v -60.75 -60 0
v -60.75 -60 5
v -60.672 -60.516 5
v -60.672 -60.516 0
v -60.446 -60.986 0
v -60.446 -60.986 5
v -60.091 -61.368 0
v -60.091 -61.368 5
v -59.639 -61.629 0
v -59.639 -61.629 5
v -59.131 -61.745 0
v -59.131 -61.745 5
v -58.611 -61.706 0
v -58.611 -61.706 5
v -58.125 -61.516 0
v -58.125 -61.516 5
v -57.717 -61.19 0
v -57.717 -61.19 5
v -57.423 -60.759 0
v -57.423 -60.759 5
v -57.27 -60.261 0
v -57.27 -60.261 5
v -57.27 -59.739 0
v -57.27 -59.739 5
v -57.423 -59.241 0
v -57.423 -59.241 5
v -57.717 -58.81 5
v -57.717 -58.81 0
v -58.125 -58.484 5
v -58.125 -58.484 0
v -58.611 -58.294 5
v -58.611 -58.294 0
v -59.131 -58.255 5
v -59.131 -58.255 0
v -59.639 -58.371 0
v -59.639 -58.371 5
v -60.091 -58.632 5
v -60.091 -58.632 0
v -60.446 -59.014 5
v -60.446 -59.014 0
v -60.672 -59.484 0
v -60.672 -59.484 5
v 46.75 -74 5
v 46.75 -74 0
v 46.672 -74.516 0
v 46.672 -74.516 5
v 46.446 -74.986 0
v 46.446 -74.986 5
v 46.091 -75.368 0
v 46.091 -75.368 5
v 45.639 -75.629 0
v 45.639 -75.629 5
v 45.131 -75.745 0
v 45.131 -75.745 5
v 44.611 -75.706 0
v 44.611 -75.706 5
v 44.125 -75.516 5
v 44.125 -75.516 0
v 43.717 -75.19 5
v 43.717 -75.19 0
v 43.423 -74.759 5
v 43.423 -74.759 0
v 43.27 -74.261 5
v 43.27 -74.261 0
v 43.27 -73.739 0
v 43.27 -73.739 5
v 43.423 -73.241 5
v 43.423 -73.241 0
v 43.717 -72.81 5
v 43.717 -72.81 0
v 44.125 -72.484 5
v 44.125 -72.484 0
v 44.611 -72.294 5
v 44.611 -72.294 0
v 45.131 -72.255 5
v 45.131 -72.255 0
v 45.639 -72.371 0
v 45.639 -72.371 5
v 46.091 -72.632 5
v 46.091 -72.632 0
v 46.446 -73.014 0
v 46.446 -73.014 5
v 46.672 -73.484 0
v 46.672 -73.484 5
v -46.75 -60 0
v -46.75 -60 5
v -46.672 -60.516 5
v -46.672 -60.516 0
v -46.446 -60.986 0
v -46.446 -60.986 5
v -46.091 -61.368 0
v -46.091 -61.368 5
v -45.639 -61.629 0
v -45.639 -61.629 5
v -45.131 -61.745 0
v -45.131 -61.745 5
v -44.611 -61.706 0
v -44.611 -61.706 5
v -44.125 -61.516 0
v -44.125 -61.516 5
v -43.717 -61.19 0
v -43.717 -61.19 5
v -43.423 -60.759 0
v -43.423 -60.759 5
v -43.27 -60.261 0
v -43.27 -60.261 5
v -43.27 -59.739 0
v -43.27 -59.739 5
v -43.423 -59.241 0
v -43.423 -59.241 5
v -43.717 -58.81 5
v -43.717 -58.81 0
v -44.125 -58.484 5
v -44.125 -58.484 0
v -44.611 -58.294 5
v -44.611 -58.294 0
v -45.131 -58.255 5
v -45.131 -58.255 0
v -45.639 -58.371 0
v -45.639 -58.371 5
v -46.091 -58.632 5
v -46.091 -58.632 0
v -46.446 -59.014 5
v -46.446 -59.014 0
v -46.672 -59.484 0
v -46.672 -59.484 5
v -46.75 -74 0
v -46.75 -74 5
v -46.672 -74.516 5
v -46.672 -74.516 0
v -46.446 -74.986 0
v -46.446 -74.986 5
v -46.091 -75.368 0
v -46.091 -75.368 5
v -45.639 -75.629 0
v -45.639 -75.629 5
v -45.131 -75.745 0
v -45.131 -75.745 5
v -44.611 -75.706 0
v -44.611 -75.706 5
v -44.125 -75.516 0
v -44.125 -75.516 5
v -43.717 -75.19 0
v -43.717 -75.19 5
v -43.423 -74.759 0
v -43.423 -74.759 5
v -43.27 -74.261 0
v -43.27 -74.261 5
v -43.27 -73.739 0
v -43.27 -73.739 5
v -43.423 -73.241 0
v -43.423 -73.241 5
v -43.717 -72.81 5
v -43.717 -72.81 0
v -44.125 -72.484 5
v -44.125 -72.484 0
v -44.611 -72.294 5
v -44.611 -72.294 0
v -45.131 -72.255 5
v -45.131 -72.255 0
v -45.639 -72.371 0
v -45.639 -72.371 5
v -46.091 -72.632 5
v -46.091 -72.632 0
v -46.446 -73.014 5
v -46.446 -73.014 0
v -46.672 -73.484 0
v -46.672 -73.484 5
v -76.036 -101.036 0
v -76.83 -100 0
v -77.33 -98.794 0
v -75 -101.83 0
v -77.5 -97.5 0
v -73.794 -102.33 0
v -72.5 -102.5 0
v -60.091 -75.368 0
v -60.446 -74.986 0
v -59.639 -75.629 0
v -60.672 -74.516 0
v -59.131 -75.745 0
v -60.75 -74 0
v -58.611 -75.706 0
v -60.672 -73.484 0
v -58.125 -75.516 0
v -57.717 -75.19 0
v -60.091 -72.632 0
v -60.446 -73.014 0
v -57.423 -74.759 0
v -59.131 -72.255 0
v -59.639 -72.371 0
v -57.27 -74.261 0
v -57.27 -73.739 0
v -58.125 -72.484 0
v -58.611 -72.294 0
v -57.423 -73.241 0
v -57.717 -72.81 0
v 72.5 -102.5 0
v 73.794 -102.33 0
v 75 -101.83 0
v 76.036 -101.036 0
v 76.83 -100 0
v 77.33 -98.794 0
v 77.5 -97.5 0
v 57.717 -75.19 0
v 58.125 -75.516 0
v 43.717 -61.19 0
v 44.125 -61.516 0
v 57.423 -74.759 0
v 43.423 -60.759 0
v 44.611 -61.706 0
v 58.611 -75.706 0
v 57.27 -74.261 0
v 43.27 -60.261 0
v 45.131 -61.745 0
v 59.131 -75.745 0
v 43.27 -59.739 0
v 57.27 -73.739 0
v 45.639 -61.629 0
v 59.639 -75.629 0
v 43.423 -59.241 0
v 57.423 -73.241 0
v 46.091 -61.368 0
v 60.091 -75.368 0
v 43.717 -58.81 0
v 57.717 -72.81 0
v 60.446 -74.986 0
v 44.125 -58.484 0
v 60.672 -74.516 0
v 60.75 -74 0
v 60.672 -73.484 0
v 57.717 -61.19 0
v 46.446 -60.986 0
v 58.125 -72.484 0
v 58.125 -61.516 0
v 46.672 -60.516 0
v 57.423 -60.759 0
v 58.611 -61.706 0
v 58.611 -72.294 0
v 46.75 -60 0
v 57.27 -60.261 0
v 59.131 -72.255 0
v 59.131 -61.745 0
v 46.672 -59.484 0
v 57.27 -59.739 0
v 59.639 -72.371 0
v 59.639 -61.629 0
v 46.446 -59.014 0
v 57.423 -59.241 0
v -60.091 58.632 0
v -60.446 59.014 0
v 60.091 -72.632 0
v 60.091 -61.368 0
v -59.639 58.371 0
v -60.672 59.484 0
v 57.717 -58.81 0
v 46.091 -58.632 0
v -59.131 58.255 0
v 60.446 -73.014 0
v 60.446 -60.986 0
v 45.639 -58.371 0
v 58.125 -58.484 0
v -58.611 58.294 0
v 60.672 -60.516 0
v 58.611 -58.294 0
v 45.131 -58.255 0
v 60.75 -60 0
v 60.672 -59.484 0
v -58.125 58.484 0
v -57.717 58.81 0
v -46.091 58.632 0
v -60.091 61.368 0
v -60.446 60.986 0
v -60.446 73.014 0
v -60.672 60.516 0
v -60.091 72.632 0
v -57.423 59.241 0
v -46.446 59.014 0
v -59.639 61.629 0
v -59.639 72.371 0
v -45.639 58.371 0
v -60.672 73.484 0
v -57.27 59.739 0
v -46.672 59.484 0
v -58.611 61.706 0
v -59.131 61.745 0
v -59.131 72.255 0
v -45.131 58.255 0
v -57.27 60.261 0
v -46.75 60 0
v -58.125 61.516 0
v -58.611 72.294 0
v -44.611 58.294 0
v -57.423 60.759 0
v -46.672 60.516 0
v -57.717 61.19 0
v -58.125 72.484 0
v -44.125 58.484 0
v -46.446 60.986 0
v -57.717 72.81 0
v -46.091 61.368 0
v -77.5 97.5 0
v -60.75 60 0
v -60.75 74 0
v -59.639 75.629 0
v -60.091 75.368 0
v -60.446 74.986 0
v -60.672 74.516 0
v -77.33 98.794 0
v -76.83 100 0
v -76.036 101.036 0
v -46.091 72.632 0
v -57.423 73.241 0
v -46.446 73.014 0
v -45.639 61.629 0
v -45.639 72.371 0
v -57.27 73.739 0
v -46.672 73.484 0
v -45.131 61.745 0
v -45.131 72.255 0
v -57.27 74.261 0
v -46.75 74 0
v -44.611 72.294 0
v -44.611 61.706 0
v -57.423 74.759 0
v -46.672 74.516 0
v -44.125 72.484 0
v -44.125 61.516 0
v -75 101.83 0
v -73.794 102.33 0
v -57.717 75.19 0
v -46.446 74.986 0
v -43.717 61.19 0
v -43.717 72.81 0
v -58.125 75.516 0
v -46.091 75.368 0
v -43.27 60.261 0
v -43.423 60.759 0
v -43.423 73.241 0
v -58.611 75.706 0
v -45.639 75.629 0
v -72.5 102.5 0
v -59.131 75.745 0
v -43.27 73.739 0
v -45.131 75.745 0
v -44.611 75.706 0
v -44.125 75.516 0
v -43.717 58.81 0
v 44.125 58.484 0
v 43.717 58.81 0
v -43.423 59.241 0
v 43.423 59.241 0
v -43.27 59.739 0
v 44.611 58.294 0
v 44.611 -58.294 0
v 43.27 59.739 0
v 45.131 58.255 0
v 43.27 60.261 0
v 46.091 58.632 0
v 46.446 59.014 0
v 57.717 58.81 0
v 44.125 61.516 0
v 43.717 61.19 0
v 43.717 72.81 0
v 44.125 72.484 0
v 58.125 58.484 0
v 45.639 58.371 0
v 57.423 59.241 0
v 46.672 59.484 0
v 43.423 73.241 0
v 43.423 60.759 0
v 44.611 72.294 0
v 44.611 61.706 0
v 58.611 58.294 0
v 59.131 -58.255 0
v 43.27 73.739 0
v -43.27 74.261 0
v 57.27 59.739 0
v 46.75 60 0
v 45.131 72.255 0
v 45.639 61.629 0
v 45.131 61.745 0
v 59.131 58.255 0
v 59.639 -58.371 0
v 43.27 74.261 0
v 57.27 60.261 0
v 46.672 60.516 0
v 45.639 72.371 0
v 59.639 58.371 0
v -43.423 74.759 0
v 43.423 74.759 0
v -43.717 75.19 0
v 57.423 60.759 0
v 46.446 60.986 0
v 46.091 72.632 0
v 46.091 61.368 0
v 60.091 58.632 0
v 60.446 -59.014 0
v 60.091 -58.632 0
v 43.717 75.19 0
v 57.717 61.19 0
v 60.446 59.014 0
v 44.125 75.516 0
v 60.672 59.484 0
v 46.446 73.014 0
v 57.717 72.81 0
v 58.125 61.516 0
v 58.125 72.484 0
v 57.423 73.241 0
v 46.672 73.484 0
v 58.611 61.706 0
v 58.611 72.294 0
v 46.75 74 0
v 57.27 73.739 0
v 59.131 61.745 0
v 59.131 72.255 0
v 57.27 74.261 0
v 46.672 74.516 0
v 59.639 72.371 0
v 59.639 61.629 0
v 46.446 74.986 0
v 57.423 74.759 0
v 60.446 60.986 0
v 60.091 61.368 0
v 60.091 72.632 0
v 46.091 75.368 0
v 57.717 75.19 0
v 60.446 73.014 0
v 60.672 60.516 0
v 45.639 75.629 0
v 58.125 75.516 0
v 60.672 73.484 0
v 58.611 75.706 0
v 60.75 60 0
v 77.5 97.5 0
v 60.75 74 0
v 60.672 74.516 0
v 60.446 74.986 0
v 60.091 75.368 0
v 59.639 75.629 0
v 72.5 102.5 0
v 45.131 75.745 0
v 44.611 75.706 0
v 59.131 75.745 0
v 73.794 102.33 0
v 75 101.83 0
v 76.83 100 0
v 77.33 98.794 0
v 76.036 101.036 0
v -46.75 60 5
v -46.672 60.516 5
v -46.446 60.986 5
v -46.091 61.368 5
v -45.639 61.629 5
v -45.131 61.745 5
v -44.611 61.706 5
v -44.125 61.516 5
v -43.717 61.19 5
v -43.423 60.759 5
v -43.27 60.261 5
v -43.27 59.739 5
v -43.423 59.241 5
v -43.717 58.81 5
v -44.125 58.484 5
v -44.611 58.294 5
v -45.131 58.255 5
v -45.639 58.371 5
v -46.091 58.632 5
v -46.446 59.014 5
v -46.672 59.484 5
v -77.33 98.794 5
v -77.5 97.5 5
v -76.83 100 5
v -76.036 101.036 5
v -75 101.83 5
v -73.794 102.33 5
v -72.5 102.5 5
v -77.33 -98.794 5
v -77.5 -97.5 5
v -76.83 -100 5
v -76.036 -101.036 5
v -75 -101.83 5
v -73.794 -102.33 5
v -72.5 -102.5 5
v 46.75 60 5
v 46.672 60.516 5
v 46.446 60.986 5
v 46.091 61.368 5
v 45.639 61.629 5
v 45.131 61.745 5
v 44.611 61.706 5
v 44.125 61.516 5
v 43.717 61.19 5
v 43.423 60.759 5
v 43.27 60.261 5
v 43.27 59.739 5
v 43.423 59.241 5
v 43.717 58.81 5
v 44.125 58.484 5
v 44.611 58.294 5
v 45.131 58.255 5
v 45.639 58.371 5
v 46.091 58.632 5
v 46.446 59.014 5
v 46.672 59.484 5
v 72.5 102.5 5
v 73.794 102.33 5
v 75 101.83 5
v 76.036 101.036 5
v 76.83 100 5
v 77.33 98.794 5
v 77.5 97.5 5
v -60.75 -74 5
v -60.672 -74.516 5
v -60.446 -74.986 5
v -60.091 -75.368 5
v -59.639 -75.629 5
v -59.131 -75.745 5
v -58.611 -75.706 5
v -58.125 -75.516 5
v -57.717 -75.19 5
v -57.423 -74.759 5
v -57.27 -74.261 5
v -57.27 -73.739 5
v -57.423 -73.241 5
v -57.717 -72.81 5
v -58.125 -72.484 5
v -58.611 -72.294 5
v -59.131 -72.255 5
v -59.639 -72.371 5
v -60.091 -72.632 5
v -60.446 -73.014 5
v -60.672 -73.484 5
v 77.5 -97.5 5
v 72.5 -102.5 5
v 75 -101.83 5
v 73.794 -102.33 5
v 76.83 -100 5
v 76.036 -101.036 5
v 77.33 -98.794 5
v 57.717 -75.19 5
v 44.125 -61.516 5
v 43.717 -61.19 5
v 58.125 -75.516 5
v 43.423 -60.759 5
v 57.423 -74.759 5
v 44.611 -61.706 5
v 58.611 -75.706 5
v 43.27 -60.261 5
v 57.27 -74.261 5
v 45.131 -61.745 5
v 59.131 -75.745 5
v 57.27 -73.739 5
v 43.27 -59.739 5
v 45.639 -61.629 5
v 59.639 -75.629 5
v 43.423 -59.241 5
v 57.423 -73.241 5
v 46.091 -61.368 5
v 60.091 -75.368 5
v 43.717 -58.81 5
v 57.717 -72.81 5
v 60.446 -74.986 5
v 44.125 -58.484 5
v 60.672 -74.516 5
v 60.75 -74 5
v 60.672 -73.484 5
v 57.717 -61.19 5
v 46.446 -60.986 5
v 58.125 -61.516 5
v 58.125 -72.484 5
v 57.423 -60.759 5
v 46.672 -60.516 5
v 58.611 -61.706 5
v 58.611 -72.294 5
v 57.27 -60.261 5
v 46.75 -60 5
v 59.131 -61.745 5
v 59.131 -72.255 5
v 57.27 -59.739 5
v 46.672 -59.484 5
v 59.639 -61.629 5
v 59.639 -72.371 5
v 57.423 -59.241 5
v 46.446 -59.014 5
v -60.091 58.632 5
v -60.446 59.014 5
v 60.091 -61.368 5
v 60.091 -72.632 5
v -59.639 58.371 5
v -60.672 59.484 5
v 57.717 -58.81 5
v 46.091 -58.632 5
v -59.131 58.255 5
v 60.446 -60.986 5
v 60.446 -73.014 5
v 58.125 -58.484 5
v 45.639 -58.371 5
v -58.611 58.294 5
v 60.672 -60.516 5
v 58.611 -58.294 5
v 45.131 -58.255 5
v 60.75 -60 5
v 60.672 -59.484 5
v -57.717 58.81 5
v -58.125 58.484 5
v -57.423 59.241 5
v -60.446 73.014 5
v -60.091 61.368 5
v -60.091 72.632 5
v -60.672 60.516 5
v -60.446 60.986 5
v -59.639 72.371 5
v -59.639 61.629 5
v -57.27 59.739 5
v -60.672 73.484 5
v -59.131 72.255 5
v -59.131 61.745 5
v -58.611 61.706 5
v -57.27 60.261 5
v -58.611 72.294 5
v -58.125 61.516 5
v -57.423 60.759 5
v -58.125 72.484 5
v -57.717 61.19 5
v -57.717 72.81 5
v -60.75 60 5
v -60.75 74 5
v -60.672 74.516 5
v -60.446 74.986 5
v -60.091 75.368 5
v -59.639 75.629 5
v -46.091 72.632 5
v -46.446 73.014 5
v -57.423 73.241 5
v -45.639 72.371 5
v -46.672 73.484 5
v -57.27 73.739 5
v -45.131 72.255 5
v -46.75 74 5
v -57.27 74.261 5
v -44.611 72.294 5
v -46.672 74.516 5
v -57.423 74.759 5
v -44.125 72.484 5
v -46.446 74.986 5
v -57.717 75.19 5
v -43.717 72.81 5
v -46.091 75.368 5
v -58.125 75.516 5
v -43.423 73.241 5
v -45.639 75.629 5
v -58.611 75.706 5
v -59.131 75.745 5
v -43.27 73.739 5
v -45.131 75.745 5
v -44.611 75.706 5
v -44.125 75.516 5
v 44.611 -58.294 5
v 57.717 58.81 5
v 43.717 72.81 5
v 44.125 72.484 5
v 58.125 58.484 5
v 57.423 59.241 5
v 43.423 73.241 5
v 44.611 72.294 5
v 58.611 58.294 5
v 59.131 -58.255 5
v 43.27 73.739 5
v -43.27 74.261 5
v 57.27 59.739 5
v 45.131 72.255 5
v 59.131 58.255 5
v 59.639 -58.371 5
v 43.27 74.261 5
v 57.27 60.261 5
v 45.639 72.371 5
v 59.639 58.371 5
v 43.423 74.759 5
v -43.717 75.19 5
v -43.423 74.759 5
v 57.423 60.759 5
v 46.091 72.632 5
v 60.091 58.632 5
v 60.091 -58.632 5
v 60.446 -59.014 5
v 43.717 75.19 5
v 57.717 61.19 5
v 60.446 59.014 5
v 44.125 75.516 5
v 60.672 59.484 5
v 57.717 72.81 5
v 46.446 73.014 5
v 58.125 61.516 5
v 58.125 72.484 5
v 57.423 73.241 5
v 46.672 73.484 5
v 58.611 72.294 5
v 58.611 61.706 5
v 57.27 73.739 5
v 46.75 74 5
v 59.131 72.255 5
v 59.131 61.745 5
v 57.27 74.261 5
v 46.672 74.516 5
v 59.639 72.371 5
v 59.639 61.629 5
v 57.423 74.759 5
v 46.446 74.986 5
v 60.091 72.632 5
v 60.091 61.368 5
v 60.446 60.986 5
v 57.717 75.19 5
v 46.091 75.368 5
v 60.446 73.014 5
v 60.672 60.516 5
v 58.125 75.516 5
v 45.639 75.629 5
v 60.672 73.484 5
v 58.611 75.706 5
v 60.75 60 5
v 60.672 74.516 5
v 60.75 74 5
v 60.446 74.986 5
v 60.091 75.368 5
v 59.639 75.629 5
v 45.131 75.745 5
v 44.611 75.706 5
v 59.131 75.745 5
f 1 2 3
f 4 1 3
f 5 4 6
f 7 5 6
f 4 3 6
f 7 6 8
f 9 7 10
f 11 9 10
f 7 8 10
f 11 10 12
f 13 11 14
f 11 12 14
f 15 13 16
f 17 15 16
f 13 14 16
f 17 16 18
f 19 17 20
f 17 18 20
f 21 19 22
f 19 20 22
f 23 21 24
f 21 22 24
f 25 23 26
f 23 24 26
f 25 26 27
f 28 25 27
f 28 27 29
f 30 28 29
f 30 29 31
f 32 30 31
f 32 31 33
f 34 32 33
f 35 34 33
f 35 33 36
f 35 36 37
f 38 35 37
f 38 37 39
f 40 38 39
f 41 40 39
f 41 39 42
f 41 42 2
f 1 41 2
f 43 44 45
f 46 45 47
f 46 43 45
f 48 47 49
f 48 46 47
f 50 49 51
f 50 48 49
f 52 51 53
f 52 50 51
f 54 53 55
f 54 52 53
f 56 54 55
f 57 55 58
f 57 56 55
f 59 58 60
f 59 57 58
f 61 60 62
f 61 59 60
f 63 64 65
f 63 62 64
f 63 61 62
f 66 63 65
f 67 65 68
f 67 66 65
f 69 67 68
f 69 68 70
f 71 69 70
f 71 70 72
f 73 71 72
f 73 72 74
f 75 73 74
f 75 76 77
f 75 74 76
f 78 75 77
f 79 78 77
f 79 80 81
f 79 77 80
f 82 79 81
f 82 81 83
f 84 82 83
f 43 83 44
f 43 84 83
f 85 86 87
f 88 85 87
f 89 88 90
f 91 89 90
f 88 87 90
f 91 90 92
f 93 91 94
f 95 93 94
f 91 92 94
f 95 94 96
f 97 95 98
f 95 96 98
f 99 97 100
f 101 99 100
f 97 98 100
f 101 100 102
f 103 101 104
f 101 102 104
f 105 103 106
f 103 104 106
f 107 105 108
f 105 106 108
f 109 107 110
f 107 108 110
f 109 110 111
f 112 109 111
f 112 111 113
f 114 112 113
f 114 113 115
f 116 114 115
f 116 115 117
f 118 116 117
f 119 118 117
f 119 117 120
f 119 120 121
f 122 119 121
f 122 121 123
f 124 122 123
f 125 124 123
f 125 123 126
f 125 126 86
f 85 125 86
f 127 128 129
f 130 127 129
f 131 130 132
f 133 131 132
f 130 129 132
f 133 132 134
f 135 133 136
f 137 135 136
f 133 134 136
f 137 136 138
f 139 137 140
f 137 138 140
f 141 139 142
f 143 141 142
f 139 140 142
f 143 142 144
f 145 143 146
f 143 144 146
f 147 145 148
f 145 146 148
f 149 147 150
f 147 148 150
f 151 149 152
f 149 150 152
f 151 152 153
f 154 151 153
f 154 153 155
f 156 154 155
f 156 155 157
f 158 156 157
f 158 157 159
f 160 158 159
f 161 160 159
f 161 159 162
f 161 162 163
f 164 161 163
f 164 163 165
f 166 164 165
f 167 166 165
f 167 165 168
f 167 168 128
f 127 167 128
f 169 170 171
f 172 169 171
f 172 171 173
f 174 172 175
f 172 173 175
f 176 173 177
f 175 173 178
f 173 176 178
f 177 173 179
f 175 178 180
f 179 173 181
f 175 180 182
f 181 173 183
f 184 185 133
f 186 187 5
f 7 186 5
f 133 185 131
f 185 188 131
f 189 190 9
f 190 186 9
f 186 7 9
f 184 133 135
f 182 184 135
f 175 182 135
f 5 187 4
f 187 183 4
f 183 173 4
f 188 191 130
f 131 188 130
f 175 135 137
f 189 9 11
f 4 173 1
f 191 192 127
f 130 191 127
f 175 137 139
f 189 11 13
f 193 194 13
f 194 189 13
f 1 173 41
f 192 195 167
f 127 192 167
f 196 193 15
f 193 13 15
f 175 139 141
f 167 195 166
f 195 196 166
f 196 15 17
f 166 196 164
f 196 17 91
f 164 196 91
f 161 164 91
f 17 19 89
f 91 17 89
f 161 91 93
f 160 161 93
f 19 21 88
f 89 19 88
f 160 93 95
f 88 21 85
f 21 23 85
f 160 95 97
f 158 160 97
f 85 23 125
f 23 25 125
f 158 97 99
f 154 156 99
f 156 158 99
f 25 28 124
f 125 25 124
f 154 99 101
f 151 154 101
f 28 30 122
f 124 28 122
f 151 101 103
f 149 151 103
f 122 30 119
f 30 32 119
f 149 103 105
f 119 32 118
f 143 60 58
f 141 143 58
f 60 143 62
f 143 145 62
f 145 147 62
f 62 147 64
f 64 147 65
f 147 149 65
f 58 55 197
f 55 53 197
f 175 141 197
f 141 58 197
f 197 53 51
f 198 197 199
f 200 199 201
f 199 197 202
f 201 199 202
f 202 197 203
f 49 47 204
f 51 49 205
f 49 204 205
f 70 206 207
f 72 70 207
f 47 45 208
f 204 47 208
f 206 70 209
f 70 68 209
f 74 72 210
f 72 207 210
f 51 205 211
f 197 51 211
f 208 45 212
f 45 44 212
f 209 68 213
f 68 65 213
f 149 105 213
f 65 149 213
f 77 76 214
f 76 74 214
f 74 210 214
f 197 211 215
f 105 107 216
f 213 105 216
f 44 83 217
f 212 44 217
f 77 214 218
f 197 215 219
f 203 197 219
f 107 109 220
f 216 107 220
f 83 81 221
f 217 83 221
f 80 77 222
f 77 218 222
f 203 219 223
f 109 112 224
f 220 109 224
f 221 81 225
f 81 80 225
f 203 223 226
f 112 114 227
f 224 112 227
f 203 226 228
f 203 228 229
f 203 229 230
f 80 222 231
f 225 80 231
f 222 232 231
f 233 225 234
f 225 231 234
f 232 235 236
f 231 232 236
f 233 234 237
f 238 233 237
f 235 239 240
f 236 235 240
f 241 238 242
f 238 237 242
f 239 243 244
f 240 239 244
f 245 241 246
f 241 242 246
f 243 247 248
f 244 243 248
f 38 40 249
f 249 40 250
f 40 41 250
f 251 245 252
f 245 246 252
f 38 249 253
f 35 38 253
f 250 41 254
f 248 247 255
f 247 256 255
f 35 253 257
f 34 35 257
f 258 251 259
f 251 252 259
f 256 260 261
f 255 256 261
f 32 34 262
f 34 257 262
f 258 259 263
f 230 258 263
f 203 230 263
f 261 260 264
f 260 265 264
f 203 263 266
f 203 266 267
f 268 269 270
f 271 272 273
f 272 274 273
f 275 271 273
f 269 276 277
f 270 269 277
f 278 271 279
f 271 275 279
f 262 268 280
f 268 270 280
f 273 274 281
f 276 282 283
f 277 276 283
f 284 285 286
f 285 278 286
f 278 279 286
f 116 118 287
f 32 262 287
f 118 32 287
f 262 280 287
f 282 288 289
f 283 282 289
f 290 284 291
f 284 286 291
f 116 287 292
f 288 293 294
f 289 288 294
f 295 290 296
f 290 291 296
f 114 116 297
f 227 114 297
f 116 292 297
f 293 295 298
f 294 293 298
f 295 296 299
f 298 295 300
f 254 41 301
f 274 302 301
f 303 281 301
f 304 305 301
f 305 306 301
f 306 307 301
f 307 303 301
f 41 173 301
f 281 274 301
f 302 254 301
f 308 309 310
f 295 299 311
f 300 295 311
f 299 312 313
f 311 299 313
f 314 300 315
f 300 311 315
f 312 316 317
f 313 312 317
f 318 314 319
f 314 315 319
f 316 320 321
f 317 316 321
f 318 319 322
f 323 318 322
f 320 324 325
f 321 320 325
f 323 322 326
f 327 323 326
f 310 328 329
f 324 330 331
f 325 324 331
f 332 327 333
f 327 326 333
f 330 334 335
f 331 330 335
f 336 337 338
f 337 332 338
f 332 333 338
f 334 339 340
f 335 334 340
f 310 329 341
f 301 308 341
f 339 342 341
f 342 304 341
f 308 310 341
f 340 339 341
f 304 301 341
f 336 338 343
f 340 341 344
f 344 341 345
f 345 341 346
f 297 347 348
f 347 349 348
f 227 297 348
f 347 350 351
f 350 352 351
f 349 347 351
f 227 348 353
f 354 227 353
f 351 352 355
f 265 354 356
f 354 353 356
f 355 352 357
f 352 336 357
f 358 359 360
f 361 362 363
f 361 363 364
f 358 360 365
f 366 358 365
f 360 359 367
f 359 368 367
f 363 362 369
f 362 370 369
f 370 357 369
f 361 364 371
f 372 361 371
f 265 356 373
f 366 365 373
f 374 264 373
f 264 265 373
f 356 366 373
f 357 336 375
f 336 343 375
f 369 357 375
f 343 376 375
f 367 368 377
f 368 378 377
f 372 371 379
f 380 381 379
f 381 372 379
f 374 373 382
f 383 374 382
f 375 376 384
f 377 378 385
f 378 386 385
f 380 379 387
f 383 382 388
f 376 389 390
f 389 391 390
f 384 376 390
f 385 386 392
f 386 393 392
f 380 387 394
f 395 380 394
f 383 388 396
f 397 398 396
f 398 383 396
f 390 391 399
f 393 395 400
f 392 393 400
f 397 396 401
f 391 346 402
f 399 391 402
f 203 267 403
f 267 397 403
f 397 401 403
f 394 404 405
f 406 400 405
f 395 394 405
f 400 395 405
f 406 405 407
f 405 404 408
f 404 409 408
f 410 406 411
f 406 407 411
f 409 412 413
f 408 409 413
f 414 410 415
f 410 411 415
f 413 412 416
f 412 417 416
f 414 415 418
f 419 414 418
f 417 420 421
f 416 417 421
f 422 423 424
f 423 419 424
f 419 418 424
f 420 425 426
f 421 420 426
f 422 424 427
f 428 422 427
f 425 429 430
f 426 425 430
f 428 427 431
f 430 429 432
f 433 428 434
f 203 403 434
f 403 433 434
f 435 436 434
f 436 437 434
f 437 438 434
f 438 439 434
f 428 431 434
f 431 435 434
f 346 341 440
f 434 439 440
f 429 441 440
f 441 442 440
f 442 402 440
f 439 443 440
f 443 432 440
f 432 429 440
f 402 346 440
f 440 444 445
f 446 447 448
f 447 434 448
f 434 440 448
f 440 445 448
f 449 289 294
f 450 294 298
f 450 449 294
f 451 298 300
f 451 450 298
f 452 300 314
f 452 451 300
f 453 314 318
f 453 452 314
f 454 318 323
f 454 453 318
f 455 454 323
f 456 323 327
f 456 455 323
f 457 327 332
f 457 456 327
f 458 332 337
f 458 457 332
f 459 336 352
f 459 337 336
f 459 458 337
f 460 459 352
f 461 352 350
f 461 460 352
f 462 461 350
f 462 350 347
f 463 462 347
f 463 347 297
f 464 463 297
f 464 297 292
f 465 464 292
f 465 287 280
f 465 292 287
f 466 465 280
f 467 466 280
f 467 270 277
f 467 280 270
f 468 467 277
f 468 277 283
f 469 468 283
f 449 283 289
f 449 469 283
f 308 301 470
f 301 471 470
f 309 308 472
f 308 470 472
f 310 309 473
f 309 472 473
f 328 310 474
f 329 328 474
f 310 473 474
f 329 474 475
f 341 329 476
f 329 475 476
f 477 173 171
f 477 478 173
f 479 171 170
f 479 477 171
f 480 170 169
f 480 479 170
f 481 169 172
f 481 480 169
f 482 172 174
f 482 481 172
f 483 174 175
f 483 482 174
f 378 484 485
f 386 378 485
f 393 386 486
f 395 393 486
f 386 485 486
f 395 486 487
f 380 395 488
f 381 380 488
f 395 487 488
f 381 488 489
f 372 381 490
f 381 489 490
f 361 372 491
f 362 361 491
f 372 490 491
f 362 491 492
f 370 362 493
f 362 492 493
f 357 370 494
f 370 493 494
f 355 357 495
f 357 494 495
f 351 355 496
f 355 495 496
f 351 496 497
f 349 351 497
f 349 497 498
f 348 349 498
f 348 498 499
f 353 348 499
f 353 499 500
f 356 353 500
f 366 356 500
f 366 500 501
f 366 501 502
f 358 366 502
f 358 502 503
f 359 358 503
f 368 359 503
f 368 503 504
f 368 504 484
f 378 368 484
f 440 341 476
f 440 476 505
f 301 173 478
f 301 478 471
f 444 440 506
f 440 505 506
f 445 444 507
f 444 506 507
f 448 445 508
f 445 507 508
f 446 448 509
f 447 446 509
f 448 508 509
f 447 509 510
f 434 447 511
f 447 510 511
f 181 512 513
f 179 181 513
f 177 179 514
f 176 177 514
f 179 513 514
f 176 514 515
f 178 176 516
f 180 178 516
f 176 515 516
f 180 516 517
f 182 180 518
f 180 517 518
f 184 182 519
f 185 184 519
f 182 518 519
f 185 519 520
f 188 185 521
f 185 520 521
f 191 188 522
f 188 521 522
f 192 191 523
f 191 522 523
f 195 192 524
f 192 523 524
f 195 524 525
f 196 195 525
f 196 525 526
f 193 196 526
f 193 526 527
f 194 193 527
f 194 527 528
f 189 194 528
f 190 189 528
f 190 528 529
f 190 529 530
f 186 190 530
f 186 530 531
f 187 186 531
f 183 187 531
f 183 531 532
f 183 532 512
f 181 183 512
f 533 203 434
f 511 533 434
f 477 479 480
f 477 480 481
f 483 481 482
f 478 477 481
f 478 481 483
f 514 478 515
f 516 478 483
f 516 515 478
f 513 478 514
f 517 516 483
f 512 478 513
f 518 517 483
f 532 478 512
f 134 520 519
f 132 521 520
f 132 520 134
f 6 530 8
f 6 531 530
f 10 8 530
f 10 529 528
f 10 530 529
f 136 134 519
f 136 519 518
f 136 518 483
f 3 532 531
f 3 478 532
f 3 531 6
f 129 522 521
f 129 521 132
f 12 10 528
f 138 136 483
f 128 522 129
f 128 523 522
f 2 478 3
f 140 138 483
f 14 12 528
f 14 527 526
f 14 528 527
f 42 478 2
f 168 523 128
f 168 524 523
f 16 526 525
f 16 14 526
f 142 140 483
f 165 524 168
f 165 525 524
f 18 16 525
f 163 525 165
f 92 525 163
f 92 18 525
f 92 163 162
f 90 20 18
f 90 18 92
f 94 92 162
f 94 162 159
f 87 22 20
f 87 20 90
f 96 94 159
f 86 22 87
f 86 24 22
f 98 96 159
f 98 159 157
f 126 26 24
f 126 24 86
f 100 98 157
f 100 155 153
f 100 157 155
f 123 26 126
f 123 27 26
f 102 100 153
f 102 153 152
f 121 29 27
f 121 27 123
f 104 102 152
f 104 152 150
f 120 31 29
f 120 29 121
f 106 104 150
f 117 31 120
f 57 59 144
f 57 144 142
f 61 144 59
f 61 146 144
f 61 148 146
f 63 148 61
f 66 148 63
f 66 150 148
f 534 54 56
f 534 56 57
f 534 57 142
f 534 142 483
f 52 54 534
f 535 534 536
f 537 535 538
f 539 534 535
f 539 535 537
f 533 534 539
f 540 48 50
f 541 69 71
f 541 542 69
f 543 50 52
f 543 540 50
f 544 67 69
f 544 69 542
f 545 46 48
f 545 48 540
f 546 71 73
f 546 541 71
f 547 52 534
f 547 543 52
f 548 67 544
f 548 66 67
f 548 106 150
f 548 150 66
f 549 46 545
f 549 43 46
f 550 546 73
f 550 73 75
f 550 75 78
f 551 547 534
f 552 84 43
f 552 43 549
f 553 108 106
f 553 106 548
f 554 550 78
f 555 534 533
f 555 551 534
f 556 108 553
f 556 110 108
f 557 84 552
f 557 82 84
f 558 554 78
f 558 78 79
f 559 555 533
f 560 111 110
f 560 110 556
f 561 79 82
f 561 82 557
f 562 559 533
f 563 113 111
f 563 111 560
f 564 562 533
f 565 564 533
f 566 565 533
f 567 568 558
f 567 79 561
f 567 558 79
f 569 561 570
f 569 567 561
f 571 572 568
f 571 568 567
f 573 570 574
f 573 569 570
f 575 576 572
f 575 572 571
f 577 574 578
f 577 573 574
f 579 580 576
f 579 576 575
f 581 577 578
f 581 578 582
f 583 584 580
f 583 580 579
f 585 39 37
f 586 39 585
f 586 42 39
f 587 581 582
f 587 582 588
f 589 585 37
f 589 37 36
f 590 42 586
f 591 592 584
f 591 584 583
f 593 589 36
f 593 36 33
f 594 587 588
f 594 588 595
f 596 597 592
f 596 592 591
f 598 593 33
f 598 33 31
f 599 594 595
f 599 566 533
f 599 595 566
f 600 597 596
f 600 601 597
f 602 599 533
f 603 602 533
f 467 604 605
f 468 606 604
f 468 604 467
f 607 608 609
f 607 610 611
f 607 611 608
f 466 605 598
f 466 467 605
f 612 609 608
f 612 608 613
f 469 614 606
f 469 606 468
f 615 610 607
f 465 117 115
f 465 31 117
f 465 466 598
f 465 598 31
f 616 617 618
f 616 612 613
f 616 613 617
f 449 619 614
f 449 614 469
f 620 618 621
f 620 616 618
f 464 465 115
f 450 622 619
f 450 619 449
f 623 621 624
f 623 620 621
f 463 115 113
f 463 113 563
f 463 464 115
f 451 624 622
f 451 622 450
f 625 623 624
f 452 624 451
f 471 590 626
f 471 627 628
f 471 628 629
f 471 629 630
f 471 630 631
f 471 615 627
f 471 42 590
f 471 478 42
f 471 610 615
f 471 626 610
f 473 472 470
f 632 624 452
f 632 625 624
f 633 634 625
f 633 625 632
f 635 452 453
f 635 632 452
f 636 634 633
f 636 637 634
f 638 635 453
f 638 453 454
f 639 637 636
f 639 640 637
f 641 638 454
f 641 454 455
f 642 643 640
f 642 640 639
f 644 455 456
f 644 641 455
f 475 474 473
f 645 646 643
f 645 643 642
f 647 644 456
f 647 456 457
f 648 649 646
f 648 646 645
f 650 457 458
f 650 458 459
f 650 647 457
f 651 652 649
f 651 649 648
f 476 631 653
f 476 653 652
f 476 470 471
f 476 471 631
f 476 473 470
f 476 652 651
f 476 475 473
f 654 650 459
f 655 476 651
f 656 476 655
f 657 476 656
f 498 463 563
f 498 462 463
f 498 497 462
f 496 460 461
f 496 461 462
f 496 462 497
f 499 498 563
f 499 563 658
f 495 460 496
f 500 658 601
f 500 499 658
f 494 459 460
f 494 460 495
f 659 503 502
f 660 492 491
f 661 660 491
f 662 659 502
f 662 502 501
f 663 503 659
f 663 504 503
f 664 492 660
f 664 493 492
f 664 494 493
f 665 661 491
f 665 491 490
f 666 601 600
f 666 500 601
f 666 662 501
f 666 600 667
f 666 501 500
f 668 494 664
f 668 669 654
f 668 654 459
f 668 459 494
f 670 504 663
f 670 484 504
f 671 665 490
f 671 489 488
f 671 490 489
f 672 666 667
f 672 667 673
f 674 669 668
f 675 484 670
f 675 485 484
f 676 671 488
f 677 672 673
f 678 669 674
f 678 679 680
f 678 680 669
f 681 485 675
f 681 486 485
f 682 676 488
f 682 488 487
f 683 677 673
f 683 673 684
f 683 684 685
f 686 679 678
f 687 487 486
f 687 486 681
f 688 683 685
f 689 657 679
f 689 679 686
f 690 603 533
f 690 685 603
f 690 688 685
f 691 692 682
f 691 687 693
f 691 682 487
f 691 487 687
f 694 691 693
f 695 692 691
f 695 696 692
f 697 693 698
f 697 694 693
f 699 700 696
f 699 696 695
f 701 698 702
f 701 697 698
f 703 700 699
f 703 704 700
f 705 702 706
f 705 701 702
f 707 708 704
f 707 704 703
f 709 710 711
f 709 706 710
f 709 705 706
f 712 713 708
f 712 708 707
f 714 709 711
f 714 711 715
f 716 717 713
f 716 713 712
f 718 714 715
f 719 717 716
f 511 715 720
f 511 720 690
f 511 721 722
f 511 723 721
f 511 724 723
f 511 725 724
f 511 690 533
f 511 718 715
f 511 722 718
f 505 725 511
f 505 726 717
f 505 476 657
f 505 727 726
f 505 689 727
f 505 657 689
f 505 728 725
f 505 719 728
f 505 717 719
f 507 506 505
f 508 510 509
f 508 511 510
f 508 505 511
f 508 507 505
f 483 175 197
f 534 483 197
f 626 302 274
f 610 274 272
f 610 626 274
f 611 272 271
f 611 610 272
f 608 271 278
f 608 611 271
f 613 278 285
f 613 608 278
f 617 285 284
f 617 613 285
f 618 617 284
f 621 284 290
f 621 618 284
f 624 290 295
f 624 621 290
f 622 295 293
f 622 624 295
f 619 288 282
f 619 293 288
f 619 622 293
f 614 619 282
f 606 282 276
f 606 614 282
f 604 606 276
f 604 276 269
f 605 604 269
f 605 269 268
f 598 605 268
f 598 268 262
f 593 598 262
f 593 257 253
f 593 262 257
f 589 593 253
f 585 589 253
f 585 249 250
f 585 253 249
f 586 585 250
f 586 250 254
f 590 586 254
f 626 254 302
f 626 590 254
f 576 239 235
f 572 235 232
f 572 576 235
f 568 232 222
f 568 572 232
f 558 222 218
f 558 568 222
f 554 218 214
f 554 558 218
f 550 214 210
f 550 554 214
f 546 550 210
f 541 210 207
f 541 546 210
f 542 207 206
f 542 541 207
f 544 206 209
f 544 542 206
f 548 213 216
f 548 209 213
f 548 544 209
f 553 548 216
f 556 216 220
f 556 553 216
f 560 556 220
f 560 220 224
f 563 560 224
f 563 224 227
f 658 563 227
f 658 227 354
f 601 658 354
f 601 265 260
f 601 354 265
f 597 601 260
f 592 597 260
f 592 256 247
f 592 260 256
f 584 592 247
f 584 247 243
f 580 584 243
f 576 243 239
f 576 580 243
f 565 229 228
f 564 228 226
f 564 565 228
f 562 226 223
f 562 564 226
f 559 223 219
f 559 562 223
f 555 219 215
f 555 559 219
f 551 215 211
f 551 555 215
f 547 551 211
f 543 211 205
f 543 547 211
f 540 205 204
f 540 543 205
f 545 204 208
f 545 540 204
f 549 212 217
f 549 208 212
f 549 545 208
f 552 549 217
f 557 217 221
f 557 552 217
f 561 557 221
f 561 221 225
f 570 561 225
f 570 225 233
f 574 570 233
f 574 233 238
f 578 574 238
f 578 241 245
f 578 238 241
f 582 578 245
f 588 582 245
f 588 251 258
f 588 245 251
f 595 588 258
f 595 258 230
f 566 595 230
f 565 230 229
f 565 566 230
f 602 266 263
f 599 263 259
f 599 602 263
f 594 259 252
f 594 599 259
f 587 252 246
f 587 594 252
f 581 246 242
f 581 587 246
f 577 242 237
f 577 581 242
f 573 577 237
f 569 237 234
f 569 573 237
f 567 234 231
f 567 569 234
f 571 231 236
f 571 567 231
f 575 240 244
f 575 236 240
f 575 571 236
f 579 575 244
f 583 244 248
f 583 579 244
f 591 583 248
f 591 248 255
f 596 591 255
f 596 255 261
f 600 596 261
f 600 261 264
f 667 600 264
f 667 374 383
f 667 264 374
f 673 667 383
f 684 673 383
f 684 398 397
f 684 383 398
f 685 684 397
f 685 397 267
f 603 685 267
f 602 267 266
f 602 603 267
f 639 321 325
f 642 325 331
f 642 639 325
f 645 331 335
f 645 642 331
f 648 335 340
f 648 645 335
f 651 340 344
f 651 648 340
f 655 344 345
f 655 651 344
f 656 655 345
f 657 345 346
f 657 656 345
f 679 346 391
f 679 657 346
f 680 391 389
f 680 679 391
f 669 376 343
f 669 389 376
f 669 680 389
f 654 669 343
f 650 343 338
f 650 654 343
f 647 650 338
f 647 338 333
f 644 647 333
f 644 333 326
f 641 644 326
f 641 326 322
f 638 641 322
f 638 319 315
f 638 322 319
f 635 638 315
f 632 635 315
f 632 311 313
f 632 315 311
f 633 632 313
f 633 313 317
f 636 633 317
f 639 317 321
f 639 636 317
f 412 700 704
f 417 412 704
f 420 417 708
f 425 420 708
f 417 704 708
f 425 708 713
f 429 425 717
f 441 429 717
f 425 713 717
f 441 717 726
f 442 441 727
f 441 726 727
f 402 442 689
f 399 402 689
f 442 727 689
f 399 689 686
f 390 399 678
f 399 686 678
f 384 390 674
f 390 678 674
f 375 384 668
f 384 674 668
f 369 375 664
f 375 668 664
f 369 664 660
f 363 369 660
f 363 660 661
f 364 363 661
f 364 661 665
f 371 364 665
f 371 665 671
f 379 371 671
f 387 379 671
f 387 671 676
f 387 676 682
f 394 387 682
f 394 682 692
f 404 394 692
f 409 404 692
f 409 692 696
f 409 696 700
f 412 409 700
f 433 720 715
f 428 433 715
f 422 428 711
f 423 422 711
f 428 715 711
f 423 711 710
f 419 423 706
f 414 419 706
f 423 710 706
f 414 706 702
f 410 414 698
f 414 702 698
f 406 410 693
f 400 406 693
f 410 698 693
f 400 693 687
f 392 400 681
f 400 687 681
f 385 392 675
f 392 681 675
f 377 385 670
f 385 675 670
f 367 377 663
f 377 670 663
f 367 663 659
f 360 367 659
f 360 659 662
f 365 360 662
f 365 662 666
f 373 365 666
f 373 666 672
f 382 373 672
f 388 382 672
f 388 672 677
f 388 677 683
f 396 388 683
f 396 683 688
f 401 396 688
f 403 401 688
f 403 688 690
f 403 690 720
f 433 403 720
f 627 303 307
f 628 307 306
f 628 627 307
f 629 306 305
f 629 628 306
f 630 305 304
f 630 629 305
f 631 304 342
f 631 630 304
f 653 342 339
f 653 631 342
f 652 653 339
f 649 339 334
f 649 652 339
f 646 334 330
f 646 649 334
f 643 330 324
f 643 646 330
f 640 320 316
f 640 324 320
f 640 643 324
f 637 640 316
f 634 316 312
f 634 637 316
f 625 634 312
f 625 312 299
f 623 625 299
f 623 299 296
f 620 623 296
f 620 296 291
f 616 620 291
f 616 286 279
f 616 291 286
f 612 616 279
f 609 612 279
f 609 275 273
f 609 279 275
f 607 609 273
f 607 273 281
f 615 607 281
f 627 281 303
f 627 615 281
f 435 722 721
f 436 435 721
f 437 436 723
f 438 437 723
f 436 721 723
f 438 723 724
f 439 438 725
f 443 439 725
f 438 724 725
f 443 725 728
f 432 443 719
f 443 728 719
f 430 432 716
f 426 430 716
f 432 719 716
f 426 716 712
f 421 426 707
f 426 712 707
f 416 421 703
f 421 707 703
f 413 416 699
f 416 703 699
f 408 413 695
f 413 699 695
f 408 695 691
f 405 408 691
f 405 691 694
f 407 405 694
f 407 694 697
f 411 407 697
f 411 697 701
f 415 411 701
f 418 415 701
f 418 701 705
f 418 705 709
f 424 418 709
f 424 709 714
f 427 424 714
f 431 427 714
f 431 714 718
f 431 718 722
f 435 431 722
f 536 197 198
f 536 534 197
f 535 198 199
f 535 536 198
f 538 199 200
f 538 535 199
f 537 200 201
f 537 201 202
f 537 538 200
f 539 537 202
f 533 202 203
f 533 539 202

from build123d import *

# Parameters (mm, degrees)
SKETCH_1_W               = 155
SKETCH_1_H               = 205
EXTRUDE_1_DEPTH          = 5
SKETCH_2_R               = 1.75
CUT_EXTRUDE_1_DEPTH      = 129.598211496
MIRROR_2_COPY_1_SKETCH_R = 1.75
MIRROR_2_COPY_1_DEPTH    = 129.598211496
FILLET_1_R               = 5


with BuildPart() as part:
    # ｽｹｯﾁ1 → ﾎﾞｽ - 押し出し1 (new body)
    with BuildSketch(Plane.XY):
        Rectangle(SKETCH_1_W, SKETCH_1_H)
    extrude(amount=EXTRUDE_1_DEPTH)

    # ｽｹｯﾁ2 → ｶｯﾄ - 押し出し1 (cut, through all)
    with BuildSketch(Plane.XY.offset(5)):
        with Locations((45, 74)):
            Circle(SKETCH_2_R)
        with Locations((59, 74)):
            Circle(SKETCH_2_R)
        with Locations((45, 60)):
            Circle(SKETCH_2_R)
        with Locations((59, 60)):
            Circle(SKETCH_2_R)
    cut_extrude_1 = extrude(amount=-CUT_EXTRUDE_1_DEPTH, mode=Mode.SUBTRACT)

    # ﾐﾗｰ1: ｶｯﾄ - 押し出し1 across plane
    add(cut_extrude_1.mirror(Plane.ZX), mode=Mode.SUBTRACT)

    # ﾐﾗｰ2: ｶｯﾄ - 押し出し1 across plane
    add(cut_extrude_1.mirror(Plane(origin=(0, 0, 0), x_dir=(0, 0, 1), z_dir=(1, 0, 0))), mode=Mode.SUBTRACT)

    # ﾐﾗｰ2 copy 1 sketch → ﾐﾗｰ2 copy 1 (cut, through all)
    with BuildSketch(Plane(origin=(0, 0, 5), x_dir=(-1, 0, 0), z_dir=(0, 0, 1))):
        with Locations((45, 74)):
            Circle(MIRROR_2_COPY_1_SKETCH_R)
        with Locations((59, 74)):
            Circle(MIRROR_2_COPY_1_SKETCH_R)
        with Locations((45, 60)):
            Circle(MIRROR_2_COPY_1_SKETCH_R)
        with Locations((59, 60)):
            Circle(MIRROR_2_COPY_1_SKETCH_R)
    extrude(amount=-MIRROR_2_COPY_1_DEPTH, mode=Mode.SUBTRACT)

    # ﾌｨﾚｯﾄ1
    fillet_1_edges = [part.edges().sort_by_distance(p)[0] for p in [
        (77.5, -102.5, 2.5),
        (-77.5, -102.5, 2.5),
        (-77.5, 102.5, 2.5),
        (77.5, 102.5, 2.5),
    ]]
    fillet(fillet_1_edges, radius=FILLET_1_R)


solid = part.part
